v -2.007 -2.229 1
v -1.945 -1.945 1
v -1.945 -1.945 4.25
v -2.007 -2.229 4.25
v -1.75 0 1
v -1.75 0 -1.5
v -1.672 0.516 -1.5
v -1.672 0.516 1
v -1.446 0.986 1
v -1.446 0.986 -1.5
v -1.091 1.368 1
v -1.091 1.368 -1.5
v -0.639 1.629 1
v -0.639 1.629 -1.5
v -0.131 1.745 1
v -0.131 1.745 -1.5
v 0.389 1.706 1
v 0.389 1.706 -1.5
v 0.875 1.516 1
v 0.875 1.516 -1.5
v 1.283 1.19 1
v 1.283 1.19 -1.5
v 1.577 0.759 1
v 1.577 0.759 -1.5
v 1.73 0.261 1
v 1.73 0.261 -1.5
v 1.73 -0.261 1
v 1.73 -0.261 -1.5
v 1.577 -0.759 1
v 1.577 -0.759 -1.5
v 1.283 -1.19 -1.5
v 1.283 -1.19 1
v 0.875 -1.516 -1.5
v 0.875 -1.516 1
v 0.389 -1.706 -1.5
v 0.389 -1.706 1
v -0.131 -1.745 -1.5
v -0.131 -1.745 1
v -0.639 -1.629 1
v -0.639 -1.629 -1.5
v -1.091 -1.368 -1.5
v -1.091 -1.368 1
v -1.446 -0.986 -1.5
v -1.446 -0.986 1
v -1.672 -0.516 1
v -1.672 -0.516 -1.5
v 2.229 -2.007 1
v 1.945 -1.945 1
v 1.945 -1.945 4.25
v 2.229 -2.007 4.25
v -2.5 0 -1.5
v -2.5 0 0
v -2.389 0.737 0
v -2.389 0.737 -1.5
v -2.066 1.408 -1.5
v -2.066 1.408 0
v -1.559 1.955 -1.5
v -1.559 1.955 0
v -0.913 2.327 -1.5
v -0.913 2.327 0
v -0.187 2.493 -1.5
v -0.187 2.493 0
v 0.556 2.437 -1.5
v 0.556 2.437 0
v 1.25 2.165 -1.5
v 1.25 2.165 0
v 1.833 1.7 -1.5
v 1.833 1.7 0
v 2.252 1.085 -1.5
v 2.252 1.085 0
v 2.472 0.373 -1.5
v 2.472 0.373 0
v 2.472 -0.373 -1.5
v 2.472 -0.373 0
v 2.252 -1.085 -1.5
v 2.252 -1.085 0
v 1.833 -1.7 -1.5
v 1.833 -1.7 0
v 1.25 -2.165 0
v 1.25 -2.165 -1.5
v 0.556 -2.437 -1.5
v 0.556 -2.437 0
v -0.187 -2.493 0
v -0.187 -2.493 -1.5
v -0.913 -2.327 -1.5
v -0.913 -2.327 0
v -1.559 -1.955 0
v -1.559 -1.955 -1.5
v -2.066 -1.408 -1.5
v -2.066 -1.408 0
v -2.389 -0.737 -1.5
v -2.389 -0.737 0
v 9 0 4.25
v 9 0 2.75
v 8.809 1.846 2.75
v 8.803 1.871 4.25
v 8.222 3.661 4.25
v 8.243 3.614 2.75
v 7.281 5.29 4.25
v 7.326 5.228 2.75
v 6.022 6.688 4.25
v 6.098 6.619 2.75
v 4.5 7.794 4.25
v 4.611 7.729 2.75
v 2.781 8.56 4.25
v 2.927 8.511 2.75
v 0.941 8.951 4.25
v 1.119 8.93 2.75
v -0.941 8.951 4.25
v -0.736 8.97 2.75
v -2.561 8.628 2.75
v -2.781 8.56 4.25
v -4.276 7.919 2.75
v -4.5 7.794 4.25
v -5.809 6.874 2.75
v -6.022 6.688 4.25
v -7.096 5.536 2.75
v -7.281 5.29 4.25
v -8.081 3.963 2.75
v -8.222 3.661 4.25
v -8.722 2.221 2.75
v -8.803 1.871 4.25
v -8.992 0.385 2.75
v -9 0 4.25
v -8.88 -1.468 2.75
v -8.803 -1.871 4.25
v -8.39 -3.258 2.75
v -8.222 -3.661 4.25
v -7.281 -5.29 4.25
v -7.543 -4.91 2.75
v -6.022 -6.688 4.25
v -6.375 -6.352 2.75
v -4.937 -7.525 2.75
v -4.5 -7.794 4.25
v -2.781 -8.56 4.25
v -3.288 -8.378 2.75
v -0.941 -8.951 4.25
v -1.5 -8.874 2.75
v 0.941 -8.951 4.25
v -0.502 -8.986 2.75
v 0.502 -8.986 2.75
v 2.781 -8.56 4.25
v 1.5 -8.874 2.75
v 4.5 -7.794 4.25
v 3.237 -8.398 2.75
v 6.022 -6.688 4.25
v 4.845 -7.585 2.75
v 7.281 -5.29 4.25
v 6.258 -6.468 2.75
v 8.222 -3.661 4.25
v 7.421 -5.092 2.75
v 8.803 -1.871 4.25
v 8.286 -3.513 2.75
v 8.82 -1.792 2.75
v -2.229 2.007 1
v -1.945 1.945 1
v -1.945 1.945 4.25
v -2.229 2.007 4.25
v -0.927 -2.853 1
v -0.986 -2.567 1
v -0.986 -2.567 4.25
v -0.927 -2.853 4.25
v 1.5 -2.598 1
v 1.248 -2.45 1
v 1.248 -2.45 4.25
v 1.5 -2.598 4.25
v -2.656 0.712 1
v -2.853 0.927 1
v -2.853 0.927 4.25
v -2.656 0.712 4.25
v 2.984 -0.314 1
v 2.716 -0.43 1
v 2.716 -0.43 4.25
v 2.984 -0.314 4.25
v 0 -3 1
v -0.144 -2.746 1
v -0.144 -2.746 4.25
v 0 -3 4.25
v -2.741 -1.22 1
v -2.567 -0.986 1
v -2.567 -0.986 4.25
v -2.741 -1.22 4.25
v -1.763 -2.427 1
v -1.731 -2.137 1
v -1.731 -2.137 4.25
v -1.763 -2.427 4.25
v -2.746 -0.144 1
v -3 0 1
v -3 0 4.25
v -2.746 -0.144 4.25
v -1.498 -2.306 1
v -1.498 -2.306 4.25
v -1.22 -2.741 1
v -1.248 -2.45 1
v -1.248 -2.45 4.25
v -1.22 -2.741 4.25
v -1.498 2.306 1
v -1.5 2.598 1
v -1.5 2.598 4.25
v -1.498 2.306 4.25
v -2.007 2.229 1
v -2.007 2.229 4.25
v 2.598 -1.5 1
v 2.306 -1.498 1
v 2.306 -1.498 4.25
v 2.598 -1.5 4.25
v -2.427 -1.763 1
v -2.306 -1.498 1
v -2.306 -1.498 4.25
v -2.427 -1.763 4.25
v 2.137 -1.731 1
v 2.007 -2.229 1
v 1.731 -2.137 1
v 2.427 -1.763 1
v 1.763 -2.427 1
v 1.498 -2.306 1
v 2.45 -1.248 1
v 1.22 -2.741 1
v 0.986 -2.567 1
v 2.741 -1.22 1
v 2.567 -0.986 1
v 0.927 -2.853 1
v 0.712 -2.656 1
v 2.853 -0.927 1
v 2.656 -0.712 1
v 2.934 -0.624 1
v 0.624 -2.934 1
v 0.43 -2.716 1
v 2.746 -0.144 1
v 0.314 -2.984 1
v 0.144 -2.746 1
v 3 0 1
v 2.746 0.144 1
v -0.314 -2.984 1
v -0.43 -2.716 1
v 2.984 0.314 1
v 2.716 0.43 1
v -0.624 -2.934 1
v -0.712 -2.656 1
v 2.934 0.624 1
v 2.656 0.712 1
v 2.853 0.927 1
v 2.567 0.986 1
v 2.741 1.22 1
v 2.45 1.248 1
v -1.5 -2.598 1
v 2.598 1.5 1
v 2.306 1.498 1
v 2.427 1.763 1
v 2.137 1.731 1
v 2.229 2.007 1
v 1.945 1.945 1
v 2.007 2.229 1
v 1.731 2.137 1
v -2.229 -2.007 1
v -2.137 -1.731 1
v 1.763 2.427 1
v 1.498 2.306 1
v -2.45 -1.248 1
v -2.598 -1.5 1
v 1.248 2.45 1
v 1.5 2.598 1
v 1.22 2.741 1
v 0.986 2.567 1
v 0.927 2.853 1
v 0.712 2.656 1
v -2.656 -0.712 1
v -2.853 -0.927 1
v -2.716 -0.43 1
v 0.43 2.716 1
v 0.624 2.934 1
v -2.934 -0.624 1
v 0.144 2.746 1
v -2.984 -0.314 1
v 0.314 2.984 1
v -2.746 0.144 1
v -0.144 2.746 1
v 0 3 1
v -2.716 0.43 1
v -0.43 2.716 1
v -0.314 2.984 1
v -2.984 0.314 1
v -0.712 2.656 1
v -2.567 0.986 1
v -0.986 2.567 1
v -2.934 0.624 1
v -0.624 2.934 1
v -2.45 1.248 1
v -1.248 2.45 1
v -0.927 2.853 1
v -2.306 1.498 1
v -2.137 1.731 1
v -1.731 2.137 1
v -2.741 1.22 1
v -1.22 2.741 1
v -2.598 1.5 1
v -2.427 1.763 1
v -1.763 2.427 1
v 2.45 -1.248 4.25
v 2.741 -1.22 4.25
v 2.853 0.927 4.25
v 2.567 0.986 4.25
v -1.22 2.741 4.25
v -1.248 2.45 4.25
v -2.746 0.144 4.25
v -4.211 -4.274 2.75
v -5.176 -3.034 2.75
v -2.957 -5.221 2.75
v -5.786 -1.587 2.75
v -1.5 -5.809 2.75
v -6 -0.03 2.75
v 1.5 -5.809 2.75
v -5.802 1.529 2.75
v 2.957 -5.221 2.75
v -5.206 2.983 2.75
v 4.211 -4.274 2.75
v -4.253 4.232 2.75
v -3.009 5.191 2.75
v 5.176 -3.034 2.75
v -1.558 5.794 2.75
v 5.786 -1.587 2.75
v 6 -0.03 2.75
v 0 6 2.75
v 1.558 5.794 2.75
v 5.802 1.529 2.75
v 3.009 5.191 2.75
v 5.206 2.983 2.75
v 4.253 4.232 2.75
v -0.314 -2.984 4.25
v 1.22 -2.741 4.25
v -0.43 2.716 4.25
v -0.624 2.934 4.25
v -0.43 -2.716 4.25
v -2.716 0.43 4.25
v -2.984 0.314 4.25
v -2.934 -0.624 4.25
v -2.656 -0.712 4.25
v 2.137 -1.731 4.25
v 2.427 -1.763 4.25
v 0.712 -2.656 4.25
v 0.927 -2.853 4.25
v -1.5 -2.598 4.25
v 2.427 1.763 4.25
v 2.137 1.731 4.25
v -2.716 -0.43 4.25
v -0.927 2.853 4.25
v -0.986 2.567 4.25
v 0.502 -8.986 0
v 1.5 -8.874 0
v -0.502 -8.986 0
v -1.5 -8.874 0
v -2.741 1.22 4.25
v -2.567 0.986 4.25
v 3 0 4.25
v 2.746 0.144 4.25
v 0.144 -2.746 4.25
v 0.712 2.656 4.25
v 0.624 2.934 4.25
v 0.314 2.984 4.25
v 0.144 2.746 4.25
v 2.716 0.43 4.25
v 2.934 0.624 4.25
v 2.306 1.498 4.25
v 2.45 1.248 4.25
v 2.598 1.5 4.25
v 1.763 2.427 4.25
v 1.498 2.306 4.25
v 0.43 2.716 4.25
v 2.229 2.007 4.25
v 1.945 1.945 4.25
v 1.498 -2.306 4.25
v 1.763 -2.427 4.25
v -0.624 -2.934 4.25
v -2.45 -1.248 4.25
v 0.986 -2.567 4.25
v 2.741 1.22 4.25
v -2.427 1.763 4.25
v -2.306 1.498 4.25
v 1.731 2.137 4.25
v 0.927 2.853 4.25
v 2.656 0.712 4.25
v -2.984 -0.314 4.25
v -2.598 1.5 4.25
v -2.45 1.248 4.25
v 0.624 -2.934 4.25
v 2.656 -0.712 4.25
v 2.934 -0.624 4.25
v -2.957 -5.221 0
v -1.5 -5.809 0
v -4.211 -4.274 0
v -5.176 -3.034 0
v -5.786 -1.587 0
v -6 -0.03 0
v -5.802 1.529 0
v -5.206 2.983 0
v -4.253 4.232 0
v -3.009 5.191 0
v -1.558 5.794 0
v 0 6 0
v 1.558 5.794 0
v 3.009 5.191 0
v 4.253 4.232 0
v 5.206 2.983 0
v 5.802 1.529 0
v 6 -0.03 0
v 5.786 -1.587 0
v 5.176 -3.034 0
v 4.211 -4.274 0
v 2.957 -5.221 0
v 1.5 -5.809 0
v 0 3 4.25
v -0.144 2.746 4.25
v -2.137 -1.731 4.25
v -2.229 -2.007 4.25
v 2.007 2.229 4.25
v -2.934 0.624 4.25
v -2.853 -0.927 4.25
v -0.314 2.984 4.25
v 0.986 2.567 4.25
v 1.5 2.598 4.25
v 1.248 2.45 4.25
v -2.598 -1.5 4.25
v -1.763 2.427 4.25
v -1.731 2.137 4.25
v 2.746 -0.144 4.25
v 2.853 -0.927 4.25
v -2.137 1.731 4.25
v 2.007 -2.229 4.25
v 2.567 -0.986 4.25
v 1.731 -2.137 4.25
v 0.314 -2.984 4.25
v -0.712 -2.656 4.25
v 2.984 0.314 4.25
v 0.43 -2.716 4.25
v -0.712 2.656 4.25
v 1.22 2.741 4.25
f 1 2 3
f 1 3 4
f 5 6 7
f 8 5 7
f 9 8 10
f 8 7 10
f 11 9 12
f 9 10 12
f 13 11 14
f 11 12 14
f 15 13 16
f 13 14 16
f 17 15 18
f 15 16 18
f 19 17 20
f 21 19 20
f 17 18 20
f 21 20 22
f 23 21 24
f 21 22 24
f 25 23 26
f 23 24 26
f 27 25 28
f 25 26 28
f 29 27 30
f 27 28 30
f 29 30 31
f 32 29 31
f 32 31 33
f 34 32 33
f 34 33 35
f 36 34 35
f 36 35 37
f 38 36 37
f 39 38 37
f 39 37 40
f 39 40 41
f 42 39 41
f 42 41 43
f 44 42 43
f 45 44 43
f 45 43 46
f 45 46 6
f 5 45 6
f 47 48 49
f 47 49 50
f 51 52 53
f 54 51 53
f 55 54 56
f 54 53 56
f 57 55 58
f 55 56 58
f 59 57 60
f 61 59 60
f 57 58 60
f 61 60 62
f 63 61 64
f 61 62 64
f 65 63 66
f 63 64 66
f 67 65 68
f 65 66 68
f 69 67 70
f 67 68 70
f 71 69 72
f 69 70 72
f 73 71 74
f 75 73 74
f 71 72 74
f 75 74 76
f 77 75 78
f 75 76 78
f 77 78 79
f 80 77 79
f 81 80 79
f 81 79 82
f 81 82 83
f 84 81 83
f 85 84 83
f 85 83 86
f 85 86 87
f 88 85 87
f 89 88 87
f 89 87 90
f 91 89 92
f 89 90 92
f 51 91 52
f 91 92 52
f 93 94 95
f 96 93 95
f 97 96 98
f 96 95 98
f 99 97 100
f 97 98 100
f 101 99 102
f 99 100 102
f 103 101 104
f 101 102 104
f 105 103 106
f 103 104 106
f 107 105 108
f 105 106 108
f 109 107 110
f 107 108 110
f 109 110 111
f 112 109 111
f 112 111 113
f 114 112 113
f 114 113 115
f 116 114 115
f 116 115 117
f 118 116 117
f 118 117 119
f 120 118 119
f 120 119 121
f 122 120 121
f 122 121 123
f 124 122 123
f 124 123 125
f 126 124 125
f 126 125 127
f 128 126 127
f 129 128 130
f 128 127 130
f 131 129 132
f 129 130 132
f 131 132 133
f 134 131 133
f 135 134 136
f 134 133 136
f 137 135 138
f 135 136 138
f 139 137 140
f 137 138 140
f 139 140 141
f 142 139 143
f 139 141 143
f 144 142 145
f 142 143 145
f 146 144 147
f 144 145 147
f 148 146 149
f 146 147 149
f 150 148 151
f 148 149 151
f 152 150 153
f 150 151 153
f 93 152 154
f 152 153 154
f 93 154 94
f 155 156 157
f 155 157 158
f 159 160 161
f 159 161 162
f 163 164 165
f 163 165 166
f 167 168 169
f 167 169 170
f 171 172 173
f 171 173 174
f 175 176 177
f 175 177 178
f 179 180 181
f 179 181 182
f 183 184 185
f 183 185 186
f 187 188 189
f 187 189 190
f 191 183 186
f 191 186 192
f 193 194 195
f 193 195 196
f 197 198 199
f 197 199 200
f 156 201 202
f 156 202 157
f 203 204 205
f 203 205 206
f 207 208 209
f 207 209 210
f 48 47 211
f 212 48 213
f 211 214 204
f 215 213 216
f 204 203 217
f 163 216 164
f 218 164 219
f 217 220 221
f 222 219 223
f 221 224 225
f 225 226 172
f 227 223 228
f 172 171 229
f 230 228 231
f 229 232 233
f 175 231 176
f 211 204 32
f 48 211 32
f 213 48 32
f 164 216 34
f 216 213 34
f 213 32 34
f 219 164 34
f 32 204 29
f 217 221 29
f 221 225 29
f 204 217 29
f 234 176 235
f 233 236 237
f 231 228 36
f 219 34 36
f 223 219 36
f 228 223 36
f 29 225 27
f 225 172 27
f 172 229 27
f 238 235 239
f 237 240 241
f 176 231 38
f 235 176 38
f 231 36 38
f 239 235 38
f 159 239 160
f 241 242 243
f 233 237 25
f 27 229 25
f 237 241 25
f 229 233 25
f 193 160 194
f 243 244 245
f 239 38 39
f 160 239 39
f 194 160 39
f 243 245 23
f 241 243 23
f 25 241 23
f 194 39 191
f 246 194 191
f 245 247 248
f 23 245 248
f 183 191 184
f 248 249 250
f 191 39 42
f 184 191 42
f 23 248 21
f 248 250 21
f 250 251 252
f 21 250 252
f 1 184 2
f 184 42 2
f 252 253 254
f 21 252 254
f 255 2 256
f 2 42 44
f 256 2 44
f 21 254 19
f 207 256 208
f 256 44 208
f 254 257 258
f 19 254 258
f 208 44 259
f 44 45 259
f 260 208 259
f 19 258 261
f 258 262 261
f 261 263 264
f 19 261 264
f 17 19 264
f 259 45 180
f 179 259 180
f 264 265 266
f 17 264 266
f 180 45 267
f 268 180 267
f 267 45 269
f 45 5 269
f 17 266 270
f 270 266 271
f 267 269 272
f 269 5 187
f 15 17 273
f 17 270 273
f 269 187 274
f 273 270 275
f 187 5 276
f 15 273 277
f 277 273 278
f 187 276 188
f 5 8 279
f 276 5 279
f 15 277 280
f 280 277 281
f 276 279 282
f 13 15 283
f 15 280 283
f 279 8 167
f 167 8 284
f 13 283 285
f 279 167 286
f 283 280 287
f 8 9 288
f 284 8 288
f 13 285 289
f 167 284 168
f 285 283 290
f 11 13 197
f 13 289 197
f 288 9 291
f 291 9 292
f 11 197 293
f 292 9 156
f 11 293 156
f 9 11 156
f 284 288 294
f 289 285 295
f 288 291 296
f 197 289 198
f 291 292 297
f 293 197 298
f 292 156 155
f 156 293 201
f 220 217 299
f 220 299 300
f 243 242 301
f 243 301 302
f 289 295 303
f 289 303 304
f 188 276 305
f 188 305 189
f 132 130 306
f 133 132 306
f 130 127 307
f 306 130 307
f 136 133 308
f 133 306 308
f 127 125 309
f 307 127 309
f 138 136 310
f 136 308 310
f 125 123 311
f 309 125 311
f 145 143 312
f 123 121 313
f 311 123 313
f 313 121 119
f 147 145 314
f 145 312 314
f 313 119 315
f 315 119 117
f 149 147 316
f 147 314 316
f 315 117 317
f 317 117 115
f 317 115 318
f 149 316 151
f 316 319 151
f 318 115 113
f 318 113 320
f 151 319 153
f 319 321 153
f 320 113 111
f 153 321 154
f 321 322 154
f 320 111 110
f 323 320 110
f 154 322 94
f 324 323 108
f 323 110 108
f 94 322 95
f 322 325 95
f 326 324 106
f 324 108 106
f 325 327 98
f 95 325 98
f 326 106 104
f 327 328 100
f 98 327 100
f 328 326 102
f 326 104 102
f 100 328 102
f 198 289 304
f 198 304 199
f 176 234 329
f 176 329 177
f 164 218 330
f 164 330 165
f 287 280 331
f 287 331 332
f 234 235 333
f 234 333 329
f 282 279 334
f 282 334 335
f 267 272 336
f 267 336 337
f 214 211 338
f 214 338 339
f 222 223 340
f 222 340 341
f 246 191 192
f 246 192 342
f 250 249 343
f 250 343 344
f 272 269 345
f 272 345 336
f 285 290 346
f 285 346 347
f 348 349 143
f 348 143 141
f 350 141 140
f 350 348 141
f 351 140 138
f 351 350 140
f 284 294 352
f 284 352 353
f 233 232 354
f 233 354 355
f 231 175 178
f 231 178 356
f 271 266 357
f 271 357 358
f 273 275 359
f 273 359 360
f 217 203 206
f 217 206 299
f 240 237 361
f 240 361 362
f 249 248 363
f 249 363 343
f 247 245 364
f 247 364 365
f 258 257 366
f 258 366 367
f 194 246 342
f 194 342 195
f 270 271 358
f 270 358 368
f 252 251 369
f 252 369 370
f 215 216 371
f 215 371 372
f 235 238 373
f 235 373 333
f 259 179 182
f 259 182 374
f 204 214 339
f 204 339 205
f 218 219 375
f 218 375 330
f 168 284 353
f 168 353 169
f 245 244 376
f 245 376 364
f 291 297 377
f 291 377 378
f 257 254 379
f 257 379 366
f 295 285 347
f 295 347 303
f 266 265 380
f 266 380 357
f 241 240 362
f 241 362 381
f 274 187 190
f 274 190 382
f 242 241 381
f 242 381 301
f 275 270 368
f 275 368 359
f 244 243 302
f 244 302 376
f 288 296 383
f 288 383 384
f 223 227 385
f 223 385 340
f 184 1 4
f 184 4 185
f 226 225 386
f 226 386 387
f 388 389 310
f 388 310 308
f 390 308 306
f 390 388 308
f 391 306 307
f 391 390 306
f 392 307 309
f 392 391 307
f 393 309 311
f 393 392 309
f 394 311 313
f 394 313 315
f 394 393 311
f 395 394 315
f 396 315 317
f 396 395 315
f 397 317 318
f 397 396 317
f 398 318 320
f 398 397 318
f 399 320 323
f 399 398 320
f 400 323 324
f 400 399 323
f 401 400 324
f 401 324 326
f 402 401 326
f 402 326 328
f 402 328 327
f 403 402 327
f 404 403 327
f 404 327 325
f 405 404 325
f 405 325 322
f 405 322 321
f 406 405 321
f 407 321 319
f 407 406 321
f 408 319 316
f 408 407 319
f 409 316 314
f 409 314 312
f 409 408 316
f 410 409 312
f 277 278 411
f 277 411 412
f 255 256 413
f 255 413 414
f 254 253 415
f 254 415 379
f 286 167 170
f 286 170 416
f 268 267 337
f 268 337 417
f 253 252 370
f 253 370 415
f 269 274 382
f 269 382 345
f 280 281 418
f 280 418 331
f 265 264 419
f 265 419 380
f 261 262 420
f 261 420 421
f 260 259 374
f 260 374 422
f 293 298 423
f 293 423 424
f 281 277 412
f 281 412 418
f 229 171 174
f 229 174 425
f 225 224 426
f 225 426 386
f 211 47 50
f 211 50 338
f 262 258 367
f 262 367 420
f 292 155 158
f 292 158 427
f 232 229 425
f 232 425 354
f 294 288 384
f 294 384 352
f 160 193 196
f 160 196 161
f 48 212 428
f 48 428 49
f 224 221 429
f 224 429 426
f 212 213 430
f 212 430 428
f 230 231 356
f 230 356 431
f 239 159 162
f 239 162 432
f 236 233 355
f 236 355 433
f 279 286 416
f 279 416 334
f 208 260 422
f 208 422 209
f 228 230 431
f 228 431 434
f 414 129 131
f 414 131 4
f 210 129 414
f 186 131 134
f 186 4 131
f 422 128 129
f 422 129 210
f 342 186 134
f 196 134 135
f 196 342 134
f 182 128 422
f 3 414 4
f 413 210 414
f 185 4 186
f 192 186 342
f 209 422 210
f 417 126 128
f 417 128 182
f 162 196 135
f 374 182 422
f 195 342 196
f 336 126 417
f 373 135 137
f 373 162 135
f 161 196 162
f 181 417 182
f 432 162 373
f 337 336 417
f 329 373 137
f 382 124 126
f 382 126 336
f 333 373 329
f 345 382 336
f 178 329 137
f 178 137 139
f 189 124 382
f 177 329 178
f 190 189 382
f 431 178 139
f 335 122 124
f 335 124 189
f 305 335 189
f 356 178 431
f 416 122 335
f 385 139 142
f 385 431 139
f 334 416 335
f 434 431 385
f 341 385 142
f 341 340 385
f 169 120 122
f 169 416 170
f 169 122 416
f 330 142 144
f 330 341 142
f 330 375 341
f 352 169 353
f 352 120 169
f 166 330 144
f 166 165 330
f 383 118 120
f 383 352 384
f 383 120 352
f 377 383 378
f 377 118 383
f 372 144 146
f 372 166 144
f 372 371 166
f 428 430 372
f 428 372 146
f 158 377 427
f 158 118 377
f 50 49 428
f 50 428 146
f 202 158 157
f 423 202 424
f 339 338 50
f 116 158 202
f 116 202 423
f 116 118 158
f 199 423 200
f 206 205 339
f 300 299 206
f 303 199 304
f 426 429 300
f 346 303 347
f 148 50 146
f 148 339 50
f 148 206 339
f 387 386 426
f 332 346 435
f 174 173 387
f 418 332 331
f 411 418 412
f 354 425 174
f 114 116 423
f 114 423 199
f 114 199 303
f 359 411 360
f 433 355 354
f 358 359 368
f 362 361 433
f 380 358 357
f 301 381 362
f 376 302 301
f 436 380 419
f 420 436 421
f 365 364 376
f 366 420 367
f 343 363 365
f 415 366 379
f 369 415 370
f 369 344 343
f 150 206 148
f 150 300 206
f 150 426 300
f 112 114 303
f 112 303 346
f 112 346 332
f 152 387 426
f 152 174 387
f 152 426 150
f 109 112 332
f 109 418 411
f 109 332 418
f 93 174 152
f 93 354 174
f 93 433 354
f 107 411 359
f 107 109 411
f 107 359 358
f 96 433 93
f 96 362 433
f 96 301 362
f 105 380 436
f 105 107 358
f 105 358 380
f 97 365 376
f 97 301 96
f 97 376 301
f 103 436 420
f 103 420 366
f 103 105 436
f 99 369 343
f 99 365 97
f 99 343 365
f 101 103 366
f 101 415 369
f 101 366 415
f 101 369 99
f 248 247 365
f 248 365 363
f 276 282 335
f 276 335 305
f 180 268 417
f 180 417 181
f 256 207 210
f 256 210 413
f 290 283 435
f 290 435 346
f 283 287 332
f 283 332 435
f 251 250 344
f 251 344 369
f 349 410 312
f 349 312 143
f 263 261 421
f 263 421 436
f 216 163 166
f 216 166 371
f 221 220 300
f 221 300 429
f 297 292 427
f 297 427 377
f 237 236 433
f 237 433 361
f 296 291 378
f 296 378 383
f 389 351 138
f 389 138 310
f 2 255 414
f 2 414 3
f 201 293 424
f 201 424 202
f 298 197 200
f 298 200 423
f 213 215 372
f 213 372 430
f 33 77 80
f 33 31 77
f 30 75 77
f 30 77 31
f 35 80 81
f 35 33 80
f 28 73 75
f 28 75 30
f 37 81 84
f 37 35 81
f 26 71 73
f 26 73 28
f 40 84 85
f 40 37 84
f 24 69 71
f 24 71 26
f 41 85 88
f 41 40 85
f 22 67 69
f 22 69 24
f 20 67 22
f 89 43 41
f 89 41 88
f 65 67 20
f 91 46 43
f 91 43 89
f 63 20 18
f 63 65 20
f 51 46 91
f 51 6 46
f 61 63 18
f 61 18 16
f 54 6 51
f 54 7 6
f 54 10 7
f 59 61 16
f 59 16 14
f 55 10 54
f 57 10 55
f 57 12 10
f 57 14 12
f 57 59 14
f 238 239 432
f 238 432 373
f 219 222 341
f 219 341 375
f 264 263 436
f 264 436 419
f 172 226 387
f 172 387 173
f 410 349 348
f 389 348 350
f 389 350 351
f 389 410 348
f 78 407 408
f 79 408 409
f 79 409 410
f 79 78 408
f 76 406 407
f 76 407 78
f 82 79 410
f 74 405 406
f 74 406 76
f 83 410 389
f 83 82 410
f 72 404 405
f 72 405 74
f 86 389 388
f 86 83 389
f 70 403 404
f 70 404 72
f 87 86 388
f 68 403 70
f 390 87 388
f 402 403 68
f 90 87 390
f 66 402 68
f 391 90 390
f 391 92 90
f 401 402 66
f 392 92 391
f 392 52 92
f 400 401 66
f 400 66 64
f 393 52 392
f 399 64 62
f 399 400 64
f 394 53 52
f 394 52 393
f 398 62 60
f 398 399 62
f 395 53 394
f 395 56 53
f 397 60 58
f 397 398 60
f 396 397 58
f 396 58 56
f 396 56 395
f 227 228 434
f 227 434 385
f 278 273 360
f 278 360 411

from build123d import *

# Parameters (mm, degrees)
BASE_EXTRUSION_DEPTH    = 2.75
ESQUISSE3_R             = 9
BOSS_EXTRU_1_DEPTH      = 1.5
ENL_V_MAT_EXTRU_2_DEPTH = 5.25
ESQUISSE5_R             = 4
BOSS_EXTRU_2_DEPTH      = 1
ESQUISSE6_R             = 2.5
BOSS_EXTRU_3_DEPTH      = 1.5
ESQUISSE7_R             = 1.75
ENL_V_MAT_EXTRU_3_DEPTH = 6.75


with BuildPart() as part:
    # Esquisse2 → Base-Extrusion (new body)
    with BuildSketch(Plane.XY):
        with BuildLine():
            Line((1.5, -5.809475019), (1.5, -8.874119675))
            ThreePointArc((1.5, -8.874119675), (0, -9), (-1.5, -8.874119675))
            Line((-1.5, -8.874119675), (-1.5, -5.809475019))
            ThreePointArc((-1.5, -5.809475019), (0, 6), (1.5, -5.809475019))
        make_face()
    extrude(amount=BASE_EXTRUSION_DEPTH)

    # Esquisse3 → Boss.-Extru.1 (add)
    with BuildSketch(Plane.XY.offset(2.75)):
        Circle(ESQUISSE3_R)
    extrude(amount=BOSS_EXTRU_1_DEPTH)

    # Esquisse1 → Enlèv. mat.-Extru.2 (cut, through all)
    with BuildSketch(Plane.XY):
        Polygon((0, 3), (-0.14392388, 2.746231221), (-0.31358539, 2.983565686), (-0.430194779, 2.716142937), (-0.623735072, 2.934442802), (-0.711752374, 2.656296022), (-0.927050983, 2.853169549), (-0.985511861, 2.567346173), (-1.220209929, 2.740636373), (-1.248473874, 2.450267942), (-1.5, 2.598076211), (-1.497757346, 2.306344062), (-1.763355757, 2.427050983), (-1.730631075, 2.137151394), (-2.007391819, 2.229434476), (-1.944543648, 1.944543648), (-2.229434476, 2.007391819), (-2.137151394, 1.730631075), (-2.427050983, 1.763355757), (-2.306344062, 1.497757346), (-2.598076211, 1.5), (-2.450267942, 1.248473874), (-2.740636373, 1.220209929), (-2.567346173, 0.985511861), (-2.853169549, 0.927050983), (-2.656296022, 0.711752374), (-2.934442802, 0.623735072), (-2.716142937, 0.430194779), (-2.983565686, 0.31358539), (-2.746231221, 0.14392388), (-3, 0), (-2.746231221, -0.14392388), (-2.983565686, -0.31358539), (-2.716142937, -0.430194779), (-2.934442802, -0.623735072), (-2.656296022, -0.711752374), (-2.853169549, -0.927050983), (-2.567346173, -0.985511861), (-2.740636373, -1.220209929), (-2.450267942, -1.248473874), (-2.598076211, -1.5), (-2.306344062, -1.497757346), (-2.427050983, -1.763355757), (-2.137151394, -1.730631075), (-2.229434476, -2.007391819), (-1.944543648, -1.944543648), (-2.007391819, -2.229434476), (-1.730631075, -2.137151394), (-1.763355757, -2.427050983), (-1.497757346, -2.306344062), (-1.5, -2.598076211), (-1.248473874, -2.450267942), (-1.220209929, -2.740636373), (-0.985511861, -2.567346173), (-0.927050983, -2.853169549), (-0.711752374, -2.656296022), (-0.623735072, -2.934442802), (-0.430194779, -2.716142937), (-0.31358539, -2.983565686), (-0.14392388, -2.746231221), (0, -3), (0.14392388, -2.746231221), (0.31358539, -2.983565686), (0.430194779, -2.716142937), (0.623735072, -2.934442802), (0.711752374, -2.656296022), (0.927050983, -2.853169549), (0.985511861, -2.567346173), (1.220209929, -2.740636373), (1.248473874, -2.450267942), (1.5, -2.598076211), (1.497757346, -2.306344062), (1.763355757, -2.427050983), (1.730631075, -2.137151394), (2.007391819, -2.229434476), (1.944543648, -1.944543648), (2.229434476, -2.007391819), (2.137151394, -1.730631075), (2.427050983, -1.763355757), (2.306344062, -1.497757346), (2.598076211, -1.5), (2.450267942, -1.248473874), (2.740636373, -1.220209929), (2.567346173, -0.985511861), (2.853169549, -0.927050983), (2.656296022, -0.711752374), (2.934442802, -0.623735072), (2.716142937, -0.430194779), (2.983565686, -0.31358539), (2.746231221, -0.14392388), (3, 0), (2.746231221, 0.14392388), (2.983565686, 0.31358539), (2.716142937, 0.430194779), (2.934442802, 0.623735072), (2.656296022, 0.711752374), (2.853169549, 0.927050983), (2.567346173, 0.985511861), (2.740636373, 1.220209929), (2.450267942, 1.248473874), (2.598076211, 1.5), (2.306344062, 1.497757346), (2.427050983, 1.763355757), (2.137151394, 1.730631075), (2.229434476, 2.007391819), (1.944543648, 1.944543648), (2.007391819, 2.229434476), (1.730631075, 2.137151394), (1.763355757, 2.427050983), (1.497757346, 2.306344062), (1.5, 2.598076211), (1.248473874, 2.450267942), (1.220209929, 2.740636373), (0.985511861, 2.567346173), (0.927050983, 2.853169549), (0.711752374, 2.656296022), (0.623735072, 2.934442802), (0.430194779, 2.716142937), (0.31358539, 2.983565686), (0.14392388, 2.746231221), align=None)
    extrude(amount=ENL_V_MAT_EXTRU_2_DEPTH, mode=Mode.SUBTRACT)

    # Esquisse5 → Boss.-Extru.2 (add)
    with BuildSketch(Plane(origin=(0, 0, 0), x_dir=(-1, 0, 0), z_dir=(0, 0, -1))):
        Circle(ESQUISSE5_R)
    extrude(amount=-BOSS_EXTRU_2_DEPTH)

    # Esquisse6 → Boss.-Extru.3 (add)
    with BuildSketch(Plane(origin=(0, 0, 0), x_dir=(-1, 0, 0), z_dir=(0, 0, -1))):
        Circle(ESQUISSE6_R)
    extrude(amount=BOSS_EXTRU_3_DEPTH)

    # Esquisse7 → Enlèv. mat.-Extru.3 (cut, through all)
    with BuildSketch(Plane(origin=(0, 0, -1.5), x_dir=(-1, 0, 0), z_dir=(0, 0, -1))):
        Circle(ESQUISSE7_R)
    extrude(amount=-ENL_V_MAT_EXTRU_3_DEPTH, mode=Mode.SUBTRACT)


solid = part.part
